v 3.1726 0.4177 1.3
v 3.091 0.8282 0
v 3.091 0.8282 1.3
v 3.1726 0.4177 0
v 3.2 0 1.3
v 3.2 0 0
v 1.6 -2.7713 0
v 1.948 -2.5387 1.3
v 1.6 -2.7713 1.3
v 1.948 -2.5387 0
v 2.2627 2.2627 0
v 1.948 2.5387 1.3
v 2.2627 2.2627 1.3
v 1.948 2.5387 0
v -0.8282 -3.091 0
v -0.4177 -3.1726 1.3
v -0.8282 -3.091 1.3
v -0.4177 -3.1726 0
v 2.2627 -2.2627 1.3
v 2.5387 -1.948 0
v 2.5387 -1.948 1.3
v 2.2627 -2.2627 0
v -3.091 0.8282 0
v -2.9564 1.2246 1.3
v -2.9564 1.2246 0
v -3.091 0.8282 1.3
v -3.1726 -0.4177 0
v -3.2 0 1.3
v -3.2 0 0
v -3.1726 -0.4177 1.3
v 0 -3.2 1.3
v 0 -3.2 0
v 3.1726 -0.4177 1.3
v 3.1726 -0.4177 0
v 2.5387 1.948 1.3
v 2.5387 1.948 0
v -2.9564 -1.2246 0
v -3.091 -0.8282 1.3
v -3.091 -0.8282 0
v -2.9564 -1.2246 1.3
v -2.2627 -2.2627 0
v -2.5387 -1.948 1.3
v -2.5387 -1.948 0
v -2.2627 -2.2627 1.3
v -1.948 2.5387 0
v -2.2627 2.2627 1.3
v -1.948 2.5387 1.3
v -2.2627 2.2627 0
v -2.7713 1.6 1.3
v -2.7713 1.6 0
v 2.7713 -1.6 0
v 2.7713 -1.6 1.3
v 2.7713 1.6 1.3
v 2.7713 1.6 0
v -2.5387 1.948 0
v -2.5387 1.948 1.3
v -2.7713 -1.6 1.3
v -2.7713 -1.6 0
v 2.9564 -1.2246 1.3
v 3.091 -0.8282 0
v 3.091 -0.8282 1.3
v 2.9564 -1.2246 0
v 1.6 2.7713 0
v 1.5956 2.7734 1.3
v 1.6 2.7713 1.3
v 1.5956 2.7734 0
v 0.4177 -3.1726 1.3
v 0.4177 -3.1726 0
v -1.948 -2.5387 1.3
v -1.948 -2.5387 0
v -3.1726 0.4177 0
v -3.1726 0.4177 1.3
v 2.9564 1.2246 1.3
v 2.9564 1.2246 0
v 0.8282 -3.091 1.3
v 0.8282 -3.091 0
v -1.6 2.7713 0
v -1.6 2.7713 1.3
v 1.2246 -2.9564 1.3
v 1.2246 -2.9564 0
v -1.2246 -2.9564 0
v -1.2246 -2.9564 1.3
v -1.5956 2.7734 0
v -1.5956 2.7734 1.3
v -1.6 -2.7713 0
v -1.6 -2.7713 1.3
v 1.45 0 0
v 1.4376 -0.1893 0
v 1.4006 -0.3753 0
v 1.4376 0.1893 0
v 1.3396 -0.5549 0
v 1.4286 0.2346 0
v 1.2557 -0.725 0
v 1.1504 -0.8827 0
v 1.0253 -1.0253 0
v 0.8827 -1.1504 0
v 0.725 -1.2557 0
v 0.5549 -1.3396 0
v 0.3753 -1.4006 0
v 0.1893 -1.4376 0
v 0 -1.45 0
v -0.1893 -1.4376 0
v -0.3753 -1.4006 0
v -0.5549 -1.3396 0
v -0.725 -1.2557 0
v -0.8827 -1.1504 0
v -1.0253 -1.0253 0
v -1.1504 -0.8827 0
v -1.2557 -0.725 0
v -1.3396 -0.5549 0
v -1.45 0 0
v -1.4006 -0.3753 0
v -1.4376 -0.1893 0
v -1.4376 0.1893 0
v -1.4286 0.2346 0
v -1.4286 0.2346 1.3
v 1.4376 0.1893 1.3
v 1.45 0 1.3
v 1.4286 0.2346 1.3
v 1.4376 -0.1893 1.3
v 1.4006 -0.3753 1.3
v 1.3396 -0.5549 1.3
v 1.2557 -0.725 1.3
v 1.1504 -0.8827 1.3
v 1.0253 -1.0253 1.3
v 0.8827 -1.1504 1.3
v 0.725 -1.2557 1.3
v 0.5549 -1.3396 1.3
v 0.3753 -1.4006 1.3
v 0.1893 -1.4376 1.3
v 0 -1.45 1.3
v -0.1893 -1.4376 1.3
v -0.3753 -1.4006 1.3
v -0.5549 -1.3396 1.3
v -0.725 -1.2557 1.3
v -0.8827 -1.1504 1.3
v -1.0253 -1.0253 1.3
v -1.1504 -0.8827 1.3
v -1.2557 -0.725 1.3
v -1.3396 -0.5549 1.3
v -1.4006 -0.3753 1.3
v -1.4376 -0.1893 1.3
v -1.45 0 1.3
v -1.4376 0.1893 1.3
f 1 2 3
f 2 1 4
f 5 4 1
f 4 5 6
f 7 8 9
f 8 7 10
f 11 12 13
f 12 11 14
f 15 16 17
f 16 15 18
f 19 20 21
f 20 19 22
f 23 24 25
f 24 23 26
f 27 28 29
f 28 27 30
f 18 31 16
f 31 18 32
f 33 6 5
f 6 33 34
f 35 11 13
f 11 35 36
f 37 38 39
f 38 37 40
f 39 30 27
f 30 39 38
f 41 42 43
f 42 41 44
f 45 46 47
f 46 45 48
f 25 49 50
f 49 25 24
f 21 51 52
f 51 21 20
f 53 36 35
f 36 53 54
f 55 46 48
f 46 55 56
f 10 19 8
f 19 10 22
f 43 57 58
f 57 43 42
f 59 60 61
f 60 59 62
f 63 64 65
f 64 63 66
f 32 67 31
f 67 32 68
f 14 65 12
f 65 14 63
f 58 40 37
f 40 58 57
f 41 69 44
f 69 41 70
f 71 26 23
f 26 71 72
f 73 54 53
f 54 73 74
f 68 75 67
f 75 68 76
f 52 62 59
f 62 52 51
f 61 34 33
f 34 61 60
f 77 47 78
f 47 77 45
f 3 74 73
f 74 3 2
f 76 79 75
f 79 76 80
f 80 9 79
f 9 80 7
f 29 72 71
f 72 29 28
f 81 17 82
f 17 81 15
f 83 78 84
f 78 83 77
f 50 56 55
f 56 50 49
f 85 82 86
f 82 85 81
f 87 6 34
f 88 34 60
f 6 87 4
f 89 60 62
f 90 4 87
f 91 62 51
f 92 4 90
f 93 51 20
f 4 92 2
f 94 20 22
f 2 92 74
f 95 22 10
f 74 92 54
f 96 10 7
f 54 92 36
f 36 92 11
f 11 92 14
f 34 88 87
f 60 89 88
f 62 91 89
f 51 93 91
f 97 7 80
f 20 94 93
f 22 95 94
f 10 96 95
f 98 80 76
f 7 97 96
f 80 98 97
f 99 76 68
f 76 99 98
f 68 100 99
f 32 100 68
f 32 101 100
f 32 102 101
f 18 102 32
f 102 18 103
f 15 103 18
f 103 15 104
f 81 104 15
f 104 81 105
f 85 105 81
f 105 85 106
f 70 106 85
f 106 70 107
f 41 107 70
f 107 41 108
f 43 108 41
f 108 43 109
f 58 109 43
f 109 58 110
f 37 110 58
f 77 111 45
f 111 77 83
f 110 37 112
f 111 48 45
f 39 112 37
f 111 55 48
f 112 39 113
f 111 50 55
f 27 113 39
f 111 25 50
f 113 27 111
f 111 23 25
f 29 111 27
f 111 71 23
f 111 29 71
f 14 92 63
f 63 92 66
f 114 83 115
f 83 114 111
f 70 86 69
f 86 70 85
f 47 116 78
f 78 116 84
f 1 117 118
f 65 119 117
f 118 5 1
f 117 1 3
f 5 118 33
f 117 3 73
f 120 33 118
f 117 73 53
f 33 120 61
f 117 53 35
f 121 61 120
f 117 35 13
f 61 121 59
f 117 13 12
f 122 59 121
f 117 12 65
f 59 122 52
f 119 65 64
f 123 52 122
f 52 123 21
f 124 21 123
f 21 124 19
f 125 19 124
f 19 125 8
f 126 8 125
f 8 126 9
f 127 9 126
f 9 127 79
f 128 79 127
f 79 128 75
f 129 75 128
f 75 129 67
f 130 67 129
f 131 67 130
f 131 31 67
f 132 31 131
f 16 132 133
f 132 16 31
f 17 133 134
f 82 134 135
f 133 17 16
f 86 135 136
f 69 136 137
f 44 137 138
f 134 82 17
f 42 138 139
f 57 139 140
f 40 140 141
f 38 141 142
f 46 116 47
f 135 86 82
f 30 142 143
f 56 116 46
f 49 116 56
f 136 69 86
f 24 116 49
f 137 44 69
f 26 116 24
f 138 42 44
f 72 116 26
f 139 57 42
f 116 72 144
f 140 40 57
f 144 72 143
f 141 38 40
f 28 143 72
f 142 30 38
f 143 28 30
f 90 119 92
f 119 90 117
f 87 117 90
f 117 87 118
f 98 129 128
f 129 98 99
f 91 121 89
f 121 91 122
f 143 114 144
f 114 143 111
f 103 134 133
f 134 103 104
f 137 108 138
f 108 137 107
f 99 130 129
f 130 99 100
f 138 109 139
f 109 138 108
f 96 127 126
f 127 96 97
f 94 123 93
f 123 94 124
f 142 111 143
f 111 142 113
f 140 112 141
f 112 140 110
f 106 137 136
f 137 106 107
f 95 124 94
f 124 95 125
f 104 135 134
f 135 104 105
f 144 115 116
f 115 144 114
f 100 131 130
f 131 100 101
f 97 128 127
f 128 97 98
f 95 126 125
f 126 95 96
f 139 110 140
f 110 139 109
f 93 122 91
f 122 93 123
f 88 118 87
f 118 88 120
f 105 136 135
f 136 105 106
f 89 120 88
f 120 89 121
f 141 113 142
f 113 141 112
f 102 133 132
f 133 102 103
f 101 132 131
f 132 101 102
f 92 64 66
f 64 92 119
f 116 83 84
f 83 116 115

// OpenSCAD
$fn=48;

module tight_c_clip(outer_d, inner_d, t, throat_w, entry_w) {
    outer_r = outer_d/2;
    inner_r = inner_d/2;
    difference() {
        difference() {
            cylinder(r=outer_r,h=t);
            translate([0,0,-0.1]) cylinder(r=inner_r,h=t+0.2);
        }
        linear_extrude(height=t+0.4)
            polygon(points=[
                [-throat_w/2,-0.2],
                [ throat_w/2,-0.2],
                [ entry_w/2,outer_r+0.4],
                [-entry_w/2,outer_r+0.4]
            ]);
    }
}

tight_c_clip(outer_d=6.40,inner_d=2.90,t=1.30,throat_w=2.80,entry_w=3.30);
